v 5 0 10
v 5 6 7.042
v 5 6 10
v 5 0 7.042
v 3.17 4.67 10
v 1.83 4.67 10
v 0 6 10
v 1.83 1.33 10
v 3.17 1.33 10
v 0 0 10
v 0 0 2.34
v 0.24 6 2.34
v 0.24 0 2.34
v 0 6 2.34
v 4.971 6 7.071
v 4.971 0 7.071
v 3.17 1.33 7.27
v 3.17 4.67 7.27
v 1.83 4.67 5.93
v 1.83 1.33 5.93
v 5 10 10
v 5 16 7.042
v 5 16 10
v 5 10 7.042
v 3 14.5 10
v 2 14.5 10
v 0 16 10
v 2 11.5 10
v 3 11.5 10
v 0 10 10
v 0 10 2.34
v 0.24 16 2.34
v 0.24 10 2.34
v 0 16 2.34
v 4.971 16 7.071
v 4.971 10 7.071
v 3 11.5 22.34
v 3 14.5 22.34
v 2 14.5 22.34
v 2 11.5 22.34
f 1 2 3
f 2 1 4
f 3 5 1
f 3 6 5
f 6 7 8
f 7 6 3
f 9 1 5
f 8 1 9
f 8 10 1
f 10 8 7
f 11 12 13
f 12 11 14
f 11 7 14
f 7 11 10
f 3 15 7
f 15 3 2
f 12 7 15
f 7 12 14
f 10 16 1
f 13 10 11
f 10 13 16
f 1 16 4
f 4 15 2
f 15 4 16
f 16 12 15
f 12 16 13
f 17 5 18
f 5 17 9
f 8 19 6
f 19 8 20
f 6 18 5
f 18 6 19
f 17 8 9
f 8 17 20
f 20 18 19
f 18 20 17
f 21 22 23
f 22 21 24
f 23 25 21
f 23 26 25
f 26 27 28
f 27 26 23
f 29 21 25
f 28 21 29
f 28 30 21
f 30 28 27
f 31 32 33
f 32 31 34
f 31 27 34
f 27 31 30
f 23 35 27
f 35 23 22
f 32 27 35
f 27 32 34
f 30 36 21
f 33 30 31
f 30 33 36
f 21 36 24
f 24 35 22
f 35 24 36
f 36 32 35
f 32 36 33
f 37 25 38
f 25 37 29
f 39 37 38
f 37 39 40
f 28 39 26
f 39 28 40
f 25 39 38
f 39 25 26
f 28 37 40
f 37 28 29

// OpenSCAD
// file: mixin.scad
$fn = 64;

POT_EDGE = 90;
POT_HEIGHT = 150;
WALL_WIDTH = 2;
CORNER_RADIUS = 3;

LEG_WIDTH = 6;
LEG_LENGTH = POT_EDGE / 4;
PIN_LENGTH = LEG_LENGTH - WALL_WIDTH * 2;

PIN_WIDTH = 3;
PIN_HEIGHT = POT_EDGE / 2 + POT_EDGE / 7;
FIT_GAP = 0.34;
OVERCUT = 0.1;

FIRST_LEG_Y = CORNER_RADIUS;
SECOND_LEG_Y = POT_EDGE - CORNER_RADIUS - LEG_WIDTH;

SLOT_WIDTH = 3;
SLOT_STEP = 6;

module rounded_box(size = [10, 10, 5], corner_radius = CORNER_RADIUS) {
  translate([size[0] / 2, size[1] / 2, 0]) {
    linear_extrude(height=size[2]) {
      minkowski() {
        square([size[0] - 2 * corner_radius, size[1] - 2 * corner_radius], center=true);
        circle(r=corner_radius);
      }
    }
  }
}

module bottom_slots() {
  between_legs_span = POT_EDGE - 2 * (CORNER_RADIUS + LEG_WIDTH);
  slot_count_half = floor((between_legs_span / 2 - SLOT_WIDTH / 2) / SLOT_STEP);
  for (slot_index = [-slot_count_half:slot_count_half])
    translate([WALL_WIDTH, POT_EDGE / 2 + slot_index * SLOT_STEP - SLOT_WIDTH / 2, -OVERCUT])
      cube([POT_EDGE, SLOT_WIDTH, WALL_WIDTH + OVERCUT * 2]);
}

module pot_shell() {
  rotate([0, -90, 0]) difference() {
    rounded_box([POT_EDGE, POT_EDGE, POT_HEIGHT]);
    translate([WALL_WIDTH, WALL_WIDTH, WALL_WIDTH])
      rounded_box([
        POT_EDGE - WALL_WIDTH * 2,
        POT_EDGE - WALL_WIDTH * 2,
        POT_HEIGHT + WALL_WIDTH * 2,
      ]);
    translate([POT_EDGE / 2, -WALL_WIDTH, -WALL_WIDTH])
      cube([POT_EDGE, POT_EDGE + WALL_WIDTH * 2, POT_HEIGHT * 2]);

    bottom_slots();
  }

  translate([-POT_HEIGHT,WALL_WIDTH,WALL_WIDTH]) cube([WALL_WIDTH,POT_EDGE - WALL_WIDTH * 2,LEG_WIDTH]);
}

module angled_cut(leg_y) {
  translate([-OVERCUT - WALL_WIDTH, leg_y - OVERCUT, 0]) rotate([0, 45, 0])
    cube([LEG_LENGTH + 2 * OVERCUT, LEG_WIDTH + 2 * OVERCUT, POT_EDGE / 2]);
}

module leg(leg_y) {
  leg_height = POT_EDGE / 2;
  difference() {
    translate([0, leg_y, WALL_WIDTH + FIT_GAP])
      cube([LEG_LENGTH, LEG_WIDTH, leg_height - WALL_WIDTH - FIT_GAP]);

    angled_cut(leg_y);
  }
}

module legs() {
  leg(FIRST_LEG_Y);
  leg(SECOND_LEG_Y);
}

module leg_pin(leg_y, pin_width, pin_length) {
  difference() {
    translate([(LEG_LENGTH - pin_length) / 2, leg_y + (LEG_WIDTH - pin_width) / 2, WALL_WIDTH + FIT_GAP])
      cube([pin_length, pin_width, PIN_HEIGHT]);

    angled_cut(leg_y);
  }
}

module leg_pins(pin_width, pin_length) {
  leg_pin(FIRST_LEG_Y, pin_width, pin_length);
  leg_pin(SECOND_LEG_Y, pin_width, pin_length);
}

module leg_with_socket(leg_y) {
  difference() {
    leg(leg_y);
    translate([0, 0, WALL_WIDTH])
      leg_pin(leg_y, PIN_WIDTH + FIT_GAP, PIN_LENGTH + FIT_GAP);
  }
}

module leg_with_pin(leg_y) {
  leg(leg_y);
  leg_pin(leg_y, PIN_WIDTH, PIN_LENGTH);
}

module top_leg(wall_y) {
  translate([-POT_HEIGHT, wall_y, 0.2])
    cube([LEG_LENGTH, LEG_WIDTH, POT_EDGE / 2]);
}

module top_legs() {
  top_leg(WALL_WIDTH);
  top_leg(POT_EDGE - WALL_WIDTH - LEG_WIDTH);
}

module top_leg_pin(wall_y, pin_width, pin_length) {
  translate([-POT_HEIGHT + (LEG_LENGTH - pin_length) / 2, wall_y + (LEG_WIDTH - pin_width) / 2, WALL_WIDTH + FIT_GAP])
    cube([pin_length, pin_width, PIN_HEIGHT]);
}

module top_leg_pins(pin_width, pin_length) {
  top_leg_pin(WALL_WIDTH, pin_width, pin_length);
  top_leg_pin(POT_EDGE - WALL_WIDTH - LEG_WIDTH, pin_width, pin_length);
}

module top_leg_with_socket(wall_y, pin_width, pin_length) {
  difference() {
    top_leg(wall_y);
    translate([
      -POT_HEIGHT + (LEG_LENGTH - (pin_length + FIT_GAP)) / 2,
      wall_y + (LEG_WIDTH - (pin_width + FIT_GAP)) / 2,
      -OVERCUT,
    ])
      cube([pin_length + FIT_GAP, pin_width + FIT_GAP, PIN_HEIGHT + OVERCUT]);
  }
}

module top_legs_with_sockets(pin_width, pin_length) {
  top_leg_with_socket(WALL_WIDTH, pin_width, pin_length);
  top_leg_with_socket(POT_EDGE - WALL_WIDTH - LEG_WIDTH, pin_width, pin_length);
}
// main file
include <mixin.scad>;

POT_EDGE = 20;
PIN_HEIGHT = 20;

leg_with_socket(0);

translate([0, 10, 0]) leg_with_pin(0);
